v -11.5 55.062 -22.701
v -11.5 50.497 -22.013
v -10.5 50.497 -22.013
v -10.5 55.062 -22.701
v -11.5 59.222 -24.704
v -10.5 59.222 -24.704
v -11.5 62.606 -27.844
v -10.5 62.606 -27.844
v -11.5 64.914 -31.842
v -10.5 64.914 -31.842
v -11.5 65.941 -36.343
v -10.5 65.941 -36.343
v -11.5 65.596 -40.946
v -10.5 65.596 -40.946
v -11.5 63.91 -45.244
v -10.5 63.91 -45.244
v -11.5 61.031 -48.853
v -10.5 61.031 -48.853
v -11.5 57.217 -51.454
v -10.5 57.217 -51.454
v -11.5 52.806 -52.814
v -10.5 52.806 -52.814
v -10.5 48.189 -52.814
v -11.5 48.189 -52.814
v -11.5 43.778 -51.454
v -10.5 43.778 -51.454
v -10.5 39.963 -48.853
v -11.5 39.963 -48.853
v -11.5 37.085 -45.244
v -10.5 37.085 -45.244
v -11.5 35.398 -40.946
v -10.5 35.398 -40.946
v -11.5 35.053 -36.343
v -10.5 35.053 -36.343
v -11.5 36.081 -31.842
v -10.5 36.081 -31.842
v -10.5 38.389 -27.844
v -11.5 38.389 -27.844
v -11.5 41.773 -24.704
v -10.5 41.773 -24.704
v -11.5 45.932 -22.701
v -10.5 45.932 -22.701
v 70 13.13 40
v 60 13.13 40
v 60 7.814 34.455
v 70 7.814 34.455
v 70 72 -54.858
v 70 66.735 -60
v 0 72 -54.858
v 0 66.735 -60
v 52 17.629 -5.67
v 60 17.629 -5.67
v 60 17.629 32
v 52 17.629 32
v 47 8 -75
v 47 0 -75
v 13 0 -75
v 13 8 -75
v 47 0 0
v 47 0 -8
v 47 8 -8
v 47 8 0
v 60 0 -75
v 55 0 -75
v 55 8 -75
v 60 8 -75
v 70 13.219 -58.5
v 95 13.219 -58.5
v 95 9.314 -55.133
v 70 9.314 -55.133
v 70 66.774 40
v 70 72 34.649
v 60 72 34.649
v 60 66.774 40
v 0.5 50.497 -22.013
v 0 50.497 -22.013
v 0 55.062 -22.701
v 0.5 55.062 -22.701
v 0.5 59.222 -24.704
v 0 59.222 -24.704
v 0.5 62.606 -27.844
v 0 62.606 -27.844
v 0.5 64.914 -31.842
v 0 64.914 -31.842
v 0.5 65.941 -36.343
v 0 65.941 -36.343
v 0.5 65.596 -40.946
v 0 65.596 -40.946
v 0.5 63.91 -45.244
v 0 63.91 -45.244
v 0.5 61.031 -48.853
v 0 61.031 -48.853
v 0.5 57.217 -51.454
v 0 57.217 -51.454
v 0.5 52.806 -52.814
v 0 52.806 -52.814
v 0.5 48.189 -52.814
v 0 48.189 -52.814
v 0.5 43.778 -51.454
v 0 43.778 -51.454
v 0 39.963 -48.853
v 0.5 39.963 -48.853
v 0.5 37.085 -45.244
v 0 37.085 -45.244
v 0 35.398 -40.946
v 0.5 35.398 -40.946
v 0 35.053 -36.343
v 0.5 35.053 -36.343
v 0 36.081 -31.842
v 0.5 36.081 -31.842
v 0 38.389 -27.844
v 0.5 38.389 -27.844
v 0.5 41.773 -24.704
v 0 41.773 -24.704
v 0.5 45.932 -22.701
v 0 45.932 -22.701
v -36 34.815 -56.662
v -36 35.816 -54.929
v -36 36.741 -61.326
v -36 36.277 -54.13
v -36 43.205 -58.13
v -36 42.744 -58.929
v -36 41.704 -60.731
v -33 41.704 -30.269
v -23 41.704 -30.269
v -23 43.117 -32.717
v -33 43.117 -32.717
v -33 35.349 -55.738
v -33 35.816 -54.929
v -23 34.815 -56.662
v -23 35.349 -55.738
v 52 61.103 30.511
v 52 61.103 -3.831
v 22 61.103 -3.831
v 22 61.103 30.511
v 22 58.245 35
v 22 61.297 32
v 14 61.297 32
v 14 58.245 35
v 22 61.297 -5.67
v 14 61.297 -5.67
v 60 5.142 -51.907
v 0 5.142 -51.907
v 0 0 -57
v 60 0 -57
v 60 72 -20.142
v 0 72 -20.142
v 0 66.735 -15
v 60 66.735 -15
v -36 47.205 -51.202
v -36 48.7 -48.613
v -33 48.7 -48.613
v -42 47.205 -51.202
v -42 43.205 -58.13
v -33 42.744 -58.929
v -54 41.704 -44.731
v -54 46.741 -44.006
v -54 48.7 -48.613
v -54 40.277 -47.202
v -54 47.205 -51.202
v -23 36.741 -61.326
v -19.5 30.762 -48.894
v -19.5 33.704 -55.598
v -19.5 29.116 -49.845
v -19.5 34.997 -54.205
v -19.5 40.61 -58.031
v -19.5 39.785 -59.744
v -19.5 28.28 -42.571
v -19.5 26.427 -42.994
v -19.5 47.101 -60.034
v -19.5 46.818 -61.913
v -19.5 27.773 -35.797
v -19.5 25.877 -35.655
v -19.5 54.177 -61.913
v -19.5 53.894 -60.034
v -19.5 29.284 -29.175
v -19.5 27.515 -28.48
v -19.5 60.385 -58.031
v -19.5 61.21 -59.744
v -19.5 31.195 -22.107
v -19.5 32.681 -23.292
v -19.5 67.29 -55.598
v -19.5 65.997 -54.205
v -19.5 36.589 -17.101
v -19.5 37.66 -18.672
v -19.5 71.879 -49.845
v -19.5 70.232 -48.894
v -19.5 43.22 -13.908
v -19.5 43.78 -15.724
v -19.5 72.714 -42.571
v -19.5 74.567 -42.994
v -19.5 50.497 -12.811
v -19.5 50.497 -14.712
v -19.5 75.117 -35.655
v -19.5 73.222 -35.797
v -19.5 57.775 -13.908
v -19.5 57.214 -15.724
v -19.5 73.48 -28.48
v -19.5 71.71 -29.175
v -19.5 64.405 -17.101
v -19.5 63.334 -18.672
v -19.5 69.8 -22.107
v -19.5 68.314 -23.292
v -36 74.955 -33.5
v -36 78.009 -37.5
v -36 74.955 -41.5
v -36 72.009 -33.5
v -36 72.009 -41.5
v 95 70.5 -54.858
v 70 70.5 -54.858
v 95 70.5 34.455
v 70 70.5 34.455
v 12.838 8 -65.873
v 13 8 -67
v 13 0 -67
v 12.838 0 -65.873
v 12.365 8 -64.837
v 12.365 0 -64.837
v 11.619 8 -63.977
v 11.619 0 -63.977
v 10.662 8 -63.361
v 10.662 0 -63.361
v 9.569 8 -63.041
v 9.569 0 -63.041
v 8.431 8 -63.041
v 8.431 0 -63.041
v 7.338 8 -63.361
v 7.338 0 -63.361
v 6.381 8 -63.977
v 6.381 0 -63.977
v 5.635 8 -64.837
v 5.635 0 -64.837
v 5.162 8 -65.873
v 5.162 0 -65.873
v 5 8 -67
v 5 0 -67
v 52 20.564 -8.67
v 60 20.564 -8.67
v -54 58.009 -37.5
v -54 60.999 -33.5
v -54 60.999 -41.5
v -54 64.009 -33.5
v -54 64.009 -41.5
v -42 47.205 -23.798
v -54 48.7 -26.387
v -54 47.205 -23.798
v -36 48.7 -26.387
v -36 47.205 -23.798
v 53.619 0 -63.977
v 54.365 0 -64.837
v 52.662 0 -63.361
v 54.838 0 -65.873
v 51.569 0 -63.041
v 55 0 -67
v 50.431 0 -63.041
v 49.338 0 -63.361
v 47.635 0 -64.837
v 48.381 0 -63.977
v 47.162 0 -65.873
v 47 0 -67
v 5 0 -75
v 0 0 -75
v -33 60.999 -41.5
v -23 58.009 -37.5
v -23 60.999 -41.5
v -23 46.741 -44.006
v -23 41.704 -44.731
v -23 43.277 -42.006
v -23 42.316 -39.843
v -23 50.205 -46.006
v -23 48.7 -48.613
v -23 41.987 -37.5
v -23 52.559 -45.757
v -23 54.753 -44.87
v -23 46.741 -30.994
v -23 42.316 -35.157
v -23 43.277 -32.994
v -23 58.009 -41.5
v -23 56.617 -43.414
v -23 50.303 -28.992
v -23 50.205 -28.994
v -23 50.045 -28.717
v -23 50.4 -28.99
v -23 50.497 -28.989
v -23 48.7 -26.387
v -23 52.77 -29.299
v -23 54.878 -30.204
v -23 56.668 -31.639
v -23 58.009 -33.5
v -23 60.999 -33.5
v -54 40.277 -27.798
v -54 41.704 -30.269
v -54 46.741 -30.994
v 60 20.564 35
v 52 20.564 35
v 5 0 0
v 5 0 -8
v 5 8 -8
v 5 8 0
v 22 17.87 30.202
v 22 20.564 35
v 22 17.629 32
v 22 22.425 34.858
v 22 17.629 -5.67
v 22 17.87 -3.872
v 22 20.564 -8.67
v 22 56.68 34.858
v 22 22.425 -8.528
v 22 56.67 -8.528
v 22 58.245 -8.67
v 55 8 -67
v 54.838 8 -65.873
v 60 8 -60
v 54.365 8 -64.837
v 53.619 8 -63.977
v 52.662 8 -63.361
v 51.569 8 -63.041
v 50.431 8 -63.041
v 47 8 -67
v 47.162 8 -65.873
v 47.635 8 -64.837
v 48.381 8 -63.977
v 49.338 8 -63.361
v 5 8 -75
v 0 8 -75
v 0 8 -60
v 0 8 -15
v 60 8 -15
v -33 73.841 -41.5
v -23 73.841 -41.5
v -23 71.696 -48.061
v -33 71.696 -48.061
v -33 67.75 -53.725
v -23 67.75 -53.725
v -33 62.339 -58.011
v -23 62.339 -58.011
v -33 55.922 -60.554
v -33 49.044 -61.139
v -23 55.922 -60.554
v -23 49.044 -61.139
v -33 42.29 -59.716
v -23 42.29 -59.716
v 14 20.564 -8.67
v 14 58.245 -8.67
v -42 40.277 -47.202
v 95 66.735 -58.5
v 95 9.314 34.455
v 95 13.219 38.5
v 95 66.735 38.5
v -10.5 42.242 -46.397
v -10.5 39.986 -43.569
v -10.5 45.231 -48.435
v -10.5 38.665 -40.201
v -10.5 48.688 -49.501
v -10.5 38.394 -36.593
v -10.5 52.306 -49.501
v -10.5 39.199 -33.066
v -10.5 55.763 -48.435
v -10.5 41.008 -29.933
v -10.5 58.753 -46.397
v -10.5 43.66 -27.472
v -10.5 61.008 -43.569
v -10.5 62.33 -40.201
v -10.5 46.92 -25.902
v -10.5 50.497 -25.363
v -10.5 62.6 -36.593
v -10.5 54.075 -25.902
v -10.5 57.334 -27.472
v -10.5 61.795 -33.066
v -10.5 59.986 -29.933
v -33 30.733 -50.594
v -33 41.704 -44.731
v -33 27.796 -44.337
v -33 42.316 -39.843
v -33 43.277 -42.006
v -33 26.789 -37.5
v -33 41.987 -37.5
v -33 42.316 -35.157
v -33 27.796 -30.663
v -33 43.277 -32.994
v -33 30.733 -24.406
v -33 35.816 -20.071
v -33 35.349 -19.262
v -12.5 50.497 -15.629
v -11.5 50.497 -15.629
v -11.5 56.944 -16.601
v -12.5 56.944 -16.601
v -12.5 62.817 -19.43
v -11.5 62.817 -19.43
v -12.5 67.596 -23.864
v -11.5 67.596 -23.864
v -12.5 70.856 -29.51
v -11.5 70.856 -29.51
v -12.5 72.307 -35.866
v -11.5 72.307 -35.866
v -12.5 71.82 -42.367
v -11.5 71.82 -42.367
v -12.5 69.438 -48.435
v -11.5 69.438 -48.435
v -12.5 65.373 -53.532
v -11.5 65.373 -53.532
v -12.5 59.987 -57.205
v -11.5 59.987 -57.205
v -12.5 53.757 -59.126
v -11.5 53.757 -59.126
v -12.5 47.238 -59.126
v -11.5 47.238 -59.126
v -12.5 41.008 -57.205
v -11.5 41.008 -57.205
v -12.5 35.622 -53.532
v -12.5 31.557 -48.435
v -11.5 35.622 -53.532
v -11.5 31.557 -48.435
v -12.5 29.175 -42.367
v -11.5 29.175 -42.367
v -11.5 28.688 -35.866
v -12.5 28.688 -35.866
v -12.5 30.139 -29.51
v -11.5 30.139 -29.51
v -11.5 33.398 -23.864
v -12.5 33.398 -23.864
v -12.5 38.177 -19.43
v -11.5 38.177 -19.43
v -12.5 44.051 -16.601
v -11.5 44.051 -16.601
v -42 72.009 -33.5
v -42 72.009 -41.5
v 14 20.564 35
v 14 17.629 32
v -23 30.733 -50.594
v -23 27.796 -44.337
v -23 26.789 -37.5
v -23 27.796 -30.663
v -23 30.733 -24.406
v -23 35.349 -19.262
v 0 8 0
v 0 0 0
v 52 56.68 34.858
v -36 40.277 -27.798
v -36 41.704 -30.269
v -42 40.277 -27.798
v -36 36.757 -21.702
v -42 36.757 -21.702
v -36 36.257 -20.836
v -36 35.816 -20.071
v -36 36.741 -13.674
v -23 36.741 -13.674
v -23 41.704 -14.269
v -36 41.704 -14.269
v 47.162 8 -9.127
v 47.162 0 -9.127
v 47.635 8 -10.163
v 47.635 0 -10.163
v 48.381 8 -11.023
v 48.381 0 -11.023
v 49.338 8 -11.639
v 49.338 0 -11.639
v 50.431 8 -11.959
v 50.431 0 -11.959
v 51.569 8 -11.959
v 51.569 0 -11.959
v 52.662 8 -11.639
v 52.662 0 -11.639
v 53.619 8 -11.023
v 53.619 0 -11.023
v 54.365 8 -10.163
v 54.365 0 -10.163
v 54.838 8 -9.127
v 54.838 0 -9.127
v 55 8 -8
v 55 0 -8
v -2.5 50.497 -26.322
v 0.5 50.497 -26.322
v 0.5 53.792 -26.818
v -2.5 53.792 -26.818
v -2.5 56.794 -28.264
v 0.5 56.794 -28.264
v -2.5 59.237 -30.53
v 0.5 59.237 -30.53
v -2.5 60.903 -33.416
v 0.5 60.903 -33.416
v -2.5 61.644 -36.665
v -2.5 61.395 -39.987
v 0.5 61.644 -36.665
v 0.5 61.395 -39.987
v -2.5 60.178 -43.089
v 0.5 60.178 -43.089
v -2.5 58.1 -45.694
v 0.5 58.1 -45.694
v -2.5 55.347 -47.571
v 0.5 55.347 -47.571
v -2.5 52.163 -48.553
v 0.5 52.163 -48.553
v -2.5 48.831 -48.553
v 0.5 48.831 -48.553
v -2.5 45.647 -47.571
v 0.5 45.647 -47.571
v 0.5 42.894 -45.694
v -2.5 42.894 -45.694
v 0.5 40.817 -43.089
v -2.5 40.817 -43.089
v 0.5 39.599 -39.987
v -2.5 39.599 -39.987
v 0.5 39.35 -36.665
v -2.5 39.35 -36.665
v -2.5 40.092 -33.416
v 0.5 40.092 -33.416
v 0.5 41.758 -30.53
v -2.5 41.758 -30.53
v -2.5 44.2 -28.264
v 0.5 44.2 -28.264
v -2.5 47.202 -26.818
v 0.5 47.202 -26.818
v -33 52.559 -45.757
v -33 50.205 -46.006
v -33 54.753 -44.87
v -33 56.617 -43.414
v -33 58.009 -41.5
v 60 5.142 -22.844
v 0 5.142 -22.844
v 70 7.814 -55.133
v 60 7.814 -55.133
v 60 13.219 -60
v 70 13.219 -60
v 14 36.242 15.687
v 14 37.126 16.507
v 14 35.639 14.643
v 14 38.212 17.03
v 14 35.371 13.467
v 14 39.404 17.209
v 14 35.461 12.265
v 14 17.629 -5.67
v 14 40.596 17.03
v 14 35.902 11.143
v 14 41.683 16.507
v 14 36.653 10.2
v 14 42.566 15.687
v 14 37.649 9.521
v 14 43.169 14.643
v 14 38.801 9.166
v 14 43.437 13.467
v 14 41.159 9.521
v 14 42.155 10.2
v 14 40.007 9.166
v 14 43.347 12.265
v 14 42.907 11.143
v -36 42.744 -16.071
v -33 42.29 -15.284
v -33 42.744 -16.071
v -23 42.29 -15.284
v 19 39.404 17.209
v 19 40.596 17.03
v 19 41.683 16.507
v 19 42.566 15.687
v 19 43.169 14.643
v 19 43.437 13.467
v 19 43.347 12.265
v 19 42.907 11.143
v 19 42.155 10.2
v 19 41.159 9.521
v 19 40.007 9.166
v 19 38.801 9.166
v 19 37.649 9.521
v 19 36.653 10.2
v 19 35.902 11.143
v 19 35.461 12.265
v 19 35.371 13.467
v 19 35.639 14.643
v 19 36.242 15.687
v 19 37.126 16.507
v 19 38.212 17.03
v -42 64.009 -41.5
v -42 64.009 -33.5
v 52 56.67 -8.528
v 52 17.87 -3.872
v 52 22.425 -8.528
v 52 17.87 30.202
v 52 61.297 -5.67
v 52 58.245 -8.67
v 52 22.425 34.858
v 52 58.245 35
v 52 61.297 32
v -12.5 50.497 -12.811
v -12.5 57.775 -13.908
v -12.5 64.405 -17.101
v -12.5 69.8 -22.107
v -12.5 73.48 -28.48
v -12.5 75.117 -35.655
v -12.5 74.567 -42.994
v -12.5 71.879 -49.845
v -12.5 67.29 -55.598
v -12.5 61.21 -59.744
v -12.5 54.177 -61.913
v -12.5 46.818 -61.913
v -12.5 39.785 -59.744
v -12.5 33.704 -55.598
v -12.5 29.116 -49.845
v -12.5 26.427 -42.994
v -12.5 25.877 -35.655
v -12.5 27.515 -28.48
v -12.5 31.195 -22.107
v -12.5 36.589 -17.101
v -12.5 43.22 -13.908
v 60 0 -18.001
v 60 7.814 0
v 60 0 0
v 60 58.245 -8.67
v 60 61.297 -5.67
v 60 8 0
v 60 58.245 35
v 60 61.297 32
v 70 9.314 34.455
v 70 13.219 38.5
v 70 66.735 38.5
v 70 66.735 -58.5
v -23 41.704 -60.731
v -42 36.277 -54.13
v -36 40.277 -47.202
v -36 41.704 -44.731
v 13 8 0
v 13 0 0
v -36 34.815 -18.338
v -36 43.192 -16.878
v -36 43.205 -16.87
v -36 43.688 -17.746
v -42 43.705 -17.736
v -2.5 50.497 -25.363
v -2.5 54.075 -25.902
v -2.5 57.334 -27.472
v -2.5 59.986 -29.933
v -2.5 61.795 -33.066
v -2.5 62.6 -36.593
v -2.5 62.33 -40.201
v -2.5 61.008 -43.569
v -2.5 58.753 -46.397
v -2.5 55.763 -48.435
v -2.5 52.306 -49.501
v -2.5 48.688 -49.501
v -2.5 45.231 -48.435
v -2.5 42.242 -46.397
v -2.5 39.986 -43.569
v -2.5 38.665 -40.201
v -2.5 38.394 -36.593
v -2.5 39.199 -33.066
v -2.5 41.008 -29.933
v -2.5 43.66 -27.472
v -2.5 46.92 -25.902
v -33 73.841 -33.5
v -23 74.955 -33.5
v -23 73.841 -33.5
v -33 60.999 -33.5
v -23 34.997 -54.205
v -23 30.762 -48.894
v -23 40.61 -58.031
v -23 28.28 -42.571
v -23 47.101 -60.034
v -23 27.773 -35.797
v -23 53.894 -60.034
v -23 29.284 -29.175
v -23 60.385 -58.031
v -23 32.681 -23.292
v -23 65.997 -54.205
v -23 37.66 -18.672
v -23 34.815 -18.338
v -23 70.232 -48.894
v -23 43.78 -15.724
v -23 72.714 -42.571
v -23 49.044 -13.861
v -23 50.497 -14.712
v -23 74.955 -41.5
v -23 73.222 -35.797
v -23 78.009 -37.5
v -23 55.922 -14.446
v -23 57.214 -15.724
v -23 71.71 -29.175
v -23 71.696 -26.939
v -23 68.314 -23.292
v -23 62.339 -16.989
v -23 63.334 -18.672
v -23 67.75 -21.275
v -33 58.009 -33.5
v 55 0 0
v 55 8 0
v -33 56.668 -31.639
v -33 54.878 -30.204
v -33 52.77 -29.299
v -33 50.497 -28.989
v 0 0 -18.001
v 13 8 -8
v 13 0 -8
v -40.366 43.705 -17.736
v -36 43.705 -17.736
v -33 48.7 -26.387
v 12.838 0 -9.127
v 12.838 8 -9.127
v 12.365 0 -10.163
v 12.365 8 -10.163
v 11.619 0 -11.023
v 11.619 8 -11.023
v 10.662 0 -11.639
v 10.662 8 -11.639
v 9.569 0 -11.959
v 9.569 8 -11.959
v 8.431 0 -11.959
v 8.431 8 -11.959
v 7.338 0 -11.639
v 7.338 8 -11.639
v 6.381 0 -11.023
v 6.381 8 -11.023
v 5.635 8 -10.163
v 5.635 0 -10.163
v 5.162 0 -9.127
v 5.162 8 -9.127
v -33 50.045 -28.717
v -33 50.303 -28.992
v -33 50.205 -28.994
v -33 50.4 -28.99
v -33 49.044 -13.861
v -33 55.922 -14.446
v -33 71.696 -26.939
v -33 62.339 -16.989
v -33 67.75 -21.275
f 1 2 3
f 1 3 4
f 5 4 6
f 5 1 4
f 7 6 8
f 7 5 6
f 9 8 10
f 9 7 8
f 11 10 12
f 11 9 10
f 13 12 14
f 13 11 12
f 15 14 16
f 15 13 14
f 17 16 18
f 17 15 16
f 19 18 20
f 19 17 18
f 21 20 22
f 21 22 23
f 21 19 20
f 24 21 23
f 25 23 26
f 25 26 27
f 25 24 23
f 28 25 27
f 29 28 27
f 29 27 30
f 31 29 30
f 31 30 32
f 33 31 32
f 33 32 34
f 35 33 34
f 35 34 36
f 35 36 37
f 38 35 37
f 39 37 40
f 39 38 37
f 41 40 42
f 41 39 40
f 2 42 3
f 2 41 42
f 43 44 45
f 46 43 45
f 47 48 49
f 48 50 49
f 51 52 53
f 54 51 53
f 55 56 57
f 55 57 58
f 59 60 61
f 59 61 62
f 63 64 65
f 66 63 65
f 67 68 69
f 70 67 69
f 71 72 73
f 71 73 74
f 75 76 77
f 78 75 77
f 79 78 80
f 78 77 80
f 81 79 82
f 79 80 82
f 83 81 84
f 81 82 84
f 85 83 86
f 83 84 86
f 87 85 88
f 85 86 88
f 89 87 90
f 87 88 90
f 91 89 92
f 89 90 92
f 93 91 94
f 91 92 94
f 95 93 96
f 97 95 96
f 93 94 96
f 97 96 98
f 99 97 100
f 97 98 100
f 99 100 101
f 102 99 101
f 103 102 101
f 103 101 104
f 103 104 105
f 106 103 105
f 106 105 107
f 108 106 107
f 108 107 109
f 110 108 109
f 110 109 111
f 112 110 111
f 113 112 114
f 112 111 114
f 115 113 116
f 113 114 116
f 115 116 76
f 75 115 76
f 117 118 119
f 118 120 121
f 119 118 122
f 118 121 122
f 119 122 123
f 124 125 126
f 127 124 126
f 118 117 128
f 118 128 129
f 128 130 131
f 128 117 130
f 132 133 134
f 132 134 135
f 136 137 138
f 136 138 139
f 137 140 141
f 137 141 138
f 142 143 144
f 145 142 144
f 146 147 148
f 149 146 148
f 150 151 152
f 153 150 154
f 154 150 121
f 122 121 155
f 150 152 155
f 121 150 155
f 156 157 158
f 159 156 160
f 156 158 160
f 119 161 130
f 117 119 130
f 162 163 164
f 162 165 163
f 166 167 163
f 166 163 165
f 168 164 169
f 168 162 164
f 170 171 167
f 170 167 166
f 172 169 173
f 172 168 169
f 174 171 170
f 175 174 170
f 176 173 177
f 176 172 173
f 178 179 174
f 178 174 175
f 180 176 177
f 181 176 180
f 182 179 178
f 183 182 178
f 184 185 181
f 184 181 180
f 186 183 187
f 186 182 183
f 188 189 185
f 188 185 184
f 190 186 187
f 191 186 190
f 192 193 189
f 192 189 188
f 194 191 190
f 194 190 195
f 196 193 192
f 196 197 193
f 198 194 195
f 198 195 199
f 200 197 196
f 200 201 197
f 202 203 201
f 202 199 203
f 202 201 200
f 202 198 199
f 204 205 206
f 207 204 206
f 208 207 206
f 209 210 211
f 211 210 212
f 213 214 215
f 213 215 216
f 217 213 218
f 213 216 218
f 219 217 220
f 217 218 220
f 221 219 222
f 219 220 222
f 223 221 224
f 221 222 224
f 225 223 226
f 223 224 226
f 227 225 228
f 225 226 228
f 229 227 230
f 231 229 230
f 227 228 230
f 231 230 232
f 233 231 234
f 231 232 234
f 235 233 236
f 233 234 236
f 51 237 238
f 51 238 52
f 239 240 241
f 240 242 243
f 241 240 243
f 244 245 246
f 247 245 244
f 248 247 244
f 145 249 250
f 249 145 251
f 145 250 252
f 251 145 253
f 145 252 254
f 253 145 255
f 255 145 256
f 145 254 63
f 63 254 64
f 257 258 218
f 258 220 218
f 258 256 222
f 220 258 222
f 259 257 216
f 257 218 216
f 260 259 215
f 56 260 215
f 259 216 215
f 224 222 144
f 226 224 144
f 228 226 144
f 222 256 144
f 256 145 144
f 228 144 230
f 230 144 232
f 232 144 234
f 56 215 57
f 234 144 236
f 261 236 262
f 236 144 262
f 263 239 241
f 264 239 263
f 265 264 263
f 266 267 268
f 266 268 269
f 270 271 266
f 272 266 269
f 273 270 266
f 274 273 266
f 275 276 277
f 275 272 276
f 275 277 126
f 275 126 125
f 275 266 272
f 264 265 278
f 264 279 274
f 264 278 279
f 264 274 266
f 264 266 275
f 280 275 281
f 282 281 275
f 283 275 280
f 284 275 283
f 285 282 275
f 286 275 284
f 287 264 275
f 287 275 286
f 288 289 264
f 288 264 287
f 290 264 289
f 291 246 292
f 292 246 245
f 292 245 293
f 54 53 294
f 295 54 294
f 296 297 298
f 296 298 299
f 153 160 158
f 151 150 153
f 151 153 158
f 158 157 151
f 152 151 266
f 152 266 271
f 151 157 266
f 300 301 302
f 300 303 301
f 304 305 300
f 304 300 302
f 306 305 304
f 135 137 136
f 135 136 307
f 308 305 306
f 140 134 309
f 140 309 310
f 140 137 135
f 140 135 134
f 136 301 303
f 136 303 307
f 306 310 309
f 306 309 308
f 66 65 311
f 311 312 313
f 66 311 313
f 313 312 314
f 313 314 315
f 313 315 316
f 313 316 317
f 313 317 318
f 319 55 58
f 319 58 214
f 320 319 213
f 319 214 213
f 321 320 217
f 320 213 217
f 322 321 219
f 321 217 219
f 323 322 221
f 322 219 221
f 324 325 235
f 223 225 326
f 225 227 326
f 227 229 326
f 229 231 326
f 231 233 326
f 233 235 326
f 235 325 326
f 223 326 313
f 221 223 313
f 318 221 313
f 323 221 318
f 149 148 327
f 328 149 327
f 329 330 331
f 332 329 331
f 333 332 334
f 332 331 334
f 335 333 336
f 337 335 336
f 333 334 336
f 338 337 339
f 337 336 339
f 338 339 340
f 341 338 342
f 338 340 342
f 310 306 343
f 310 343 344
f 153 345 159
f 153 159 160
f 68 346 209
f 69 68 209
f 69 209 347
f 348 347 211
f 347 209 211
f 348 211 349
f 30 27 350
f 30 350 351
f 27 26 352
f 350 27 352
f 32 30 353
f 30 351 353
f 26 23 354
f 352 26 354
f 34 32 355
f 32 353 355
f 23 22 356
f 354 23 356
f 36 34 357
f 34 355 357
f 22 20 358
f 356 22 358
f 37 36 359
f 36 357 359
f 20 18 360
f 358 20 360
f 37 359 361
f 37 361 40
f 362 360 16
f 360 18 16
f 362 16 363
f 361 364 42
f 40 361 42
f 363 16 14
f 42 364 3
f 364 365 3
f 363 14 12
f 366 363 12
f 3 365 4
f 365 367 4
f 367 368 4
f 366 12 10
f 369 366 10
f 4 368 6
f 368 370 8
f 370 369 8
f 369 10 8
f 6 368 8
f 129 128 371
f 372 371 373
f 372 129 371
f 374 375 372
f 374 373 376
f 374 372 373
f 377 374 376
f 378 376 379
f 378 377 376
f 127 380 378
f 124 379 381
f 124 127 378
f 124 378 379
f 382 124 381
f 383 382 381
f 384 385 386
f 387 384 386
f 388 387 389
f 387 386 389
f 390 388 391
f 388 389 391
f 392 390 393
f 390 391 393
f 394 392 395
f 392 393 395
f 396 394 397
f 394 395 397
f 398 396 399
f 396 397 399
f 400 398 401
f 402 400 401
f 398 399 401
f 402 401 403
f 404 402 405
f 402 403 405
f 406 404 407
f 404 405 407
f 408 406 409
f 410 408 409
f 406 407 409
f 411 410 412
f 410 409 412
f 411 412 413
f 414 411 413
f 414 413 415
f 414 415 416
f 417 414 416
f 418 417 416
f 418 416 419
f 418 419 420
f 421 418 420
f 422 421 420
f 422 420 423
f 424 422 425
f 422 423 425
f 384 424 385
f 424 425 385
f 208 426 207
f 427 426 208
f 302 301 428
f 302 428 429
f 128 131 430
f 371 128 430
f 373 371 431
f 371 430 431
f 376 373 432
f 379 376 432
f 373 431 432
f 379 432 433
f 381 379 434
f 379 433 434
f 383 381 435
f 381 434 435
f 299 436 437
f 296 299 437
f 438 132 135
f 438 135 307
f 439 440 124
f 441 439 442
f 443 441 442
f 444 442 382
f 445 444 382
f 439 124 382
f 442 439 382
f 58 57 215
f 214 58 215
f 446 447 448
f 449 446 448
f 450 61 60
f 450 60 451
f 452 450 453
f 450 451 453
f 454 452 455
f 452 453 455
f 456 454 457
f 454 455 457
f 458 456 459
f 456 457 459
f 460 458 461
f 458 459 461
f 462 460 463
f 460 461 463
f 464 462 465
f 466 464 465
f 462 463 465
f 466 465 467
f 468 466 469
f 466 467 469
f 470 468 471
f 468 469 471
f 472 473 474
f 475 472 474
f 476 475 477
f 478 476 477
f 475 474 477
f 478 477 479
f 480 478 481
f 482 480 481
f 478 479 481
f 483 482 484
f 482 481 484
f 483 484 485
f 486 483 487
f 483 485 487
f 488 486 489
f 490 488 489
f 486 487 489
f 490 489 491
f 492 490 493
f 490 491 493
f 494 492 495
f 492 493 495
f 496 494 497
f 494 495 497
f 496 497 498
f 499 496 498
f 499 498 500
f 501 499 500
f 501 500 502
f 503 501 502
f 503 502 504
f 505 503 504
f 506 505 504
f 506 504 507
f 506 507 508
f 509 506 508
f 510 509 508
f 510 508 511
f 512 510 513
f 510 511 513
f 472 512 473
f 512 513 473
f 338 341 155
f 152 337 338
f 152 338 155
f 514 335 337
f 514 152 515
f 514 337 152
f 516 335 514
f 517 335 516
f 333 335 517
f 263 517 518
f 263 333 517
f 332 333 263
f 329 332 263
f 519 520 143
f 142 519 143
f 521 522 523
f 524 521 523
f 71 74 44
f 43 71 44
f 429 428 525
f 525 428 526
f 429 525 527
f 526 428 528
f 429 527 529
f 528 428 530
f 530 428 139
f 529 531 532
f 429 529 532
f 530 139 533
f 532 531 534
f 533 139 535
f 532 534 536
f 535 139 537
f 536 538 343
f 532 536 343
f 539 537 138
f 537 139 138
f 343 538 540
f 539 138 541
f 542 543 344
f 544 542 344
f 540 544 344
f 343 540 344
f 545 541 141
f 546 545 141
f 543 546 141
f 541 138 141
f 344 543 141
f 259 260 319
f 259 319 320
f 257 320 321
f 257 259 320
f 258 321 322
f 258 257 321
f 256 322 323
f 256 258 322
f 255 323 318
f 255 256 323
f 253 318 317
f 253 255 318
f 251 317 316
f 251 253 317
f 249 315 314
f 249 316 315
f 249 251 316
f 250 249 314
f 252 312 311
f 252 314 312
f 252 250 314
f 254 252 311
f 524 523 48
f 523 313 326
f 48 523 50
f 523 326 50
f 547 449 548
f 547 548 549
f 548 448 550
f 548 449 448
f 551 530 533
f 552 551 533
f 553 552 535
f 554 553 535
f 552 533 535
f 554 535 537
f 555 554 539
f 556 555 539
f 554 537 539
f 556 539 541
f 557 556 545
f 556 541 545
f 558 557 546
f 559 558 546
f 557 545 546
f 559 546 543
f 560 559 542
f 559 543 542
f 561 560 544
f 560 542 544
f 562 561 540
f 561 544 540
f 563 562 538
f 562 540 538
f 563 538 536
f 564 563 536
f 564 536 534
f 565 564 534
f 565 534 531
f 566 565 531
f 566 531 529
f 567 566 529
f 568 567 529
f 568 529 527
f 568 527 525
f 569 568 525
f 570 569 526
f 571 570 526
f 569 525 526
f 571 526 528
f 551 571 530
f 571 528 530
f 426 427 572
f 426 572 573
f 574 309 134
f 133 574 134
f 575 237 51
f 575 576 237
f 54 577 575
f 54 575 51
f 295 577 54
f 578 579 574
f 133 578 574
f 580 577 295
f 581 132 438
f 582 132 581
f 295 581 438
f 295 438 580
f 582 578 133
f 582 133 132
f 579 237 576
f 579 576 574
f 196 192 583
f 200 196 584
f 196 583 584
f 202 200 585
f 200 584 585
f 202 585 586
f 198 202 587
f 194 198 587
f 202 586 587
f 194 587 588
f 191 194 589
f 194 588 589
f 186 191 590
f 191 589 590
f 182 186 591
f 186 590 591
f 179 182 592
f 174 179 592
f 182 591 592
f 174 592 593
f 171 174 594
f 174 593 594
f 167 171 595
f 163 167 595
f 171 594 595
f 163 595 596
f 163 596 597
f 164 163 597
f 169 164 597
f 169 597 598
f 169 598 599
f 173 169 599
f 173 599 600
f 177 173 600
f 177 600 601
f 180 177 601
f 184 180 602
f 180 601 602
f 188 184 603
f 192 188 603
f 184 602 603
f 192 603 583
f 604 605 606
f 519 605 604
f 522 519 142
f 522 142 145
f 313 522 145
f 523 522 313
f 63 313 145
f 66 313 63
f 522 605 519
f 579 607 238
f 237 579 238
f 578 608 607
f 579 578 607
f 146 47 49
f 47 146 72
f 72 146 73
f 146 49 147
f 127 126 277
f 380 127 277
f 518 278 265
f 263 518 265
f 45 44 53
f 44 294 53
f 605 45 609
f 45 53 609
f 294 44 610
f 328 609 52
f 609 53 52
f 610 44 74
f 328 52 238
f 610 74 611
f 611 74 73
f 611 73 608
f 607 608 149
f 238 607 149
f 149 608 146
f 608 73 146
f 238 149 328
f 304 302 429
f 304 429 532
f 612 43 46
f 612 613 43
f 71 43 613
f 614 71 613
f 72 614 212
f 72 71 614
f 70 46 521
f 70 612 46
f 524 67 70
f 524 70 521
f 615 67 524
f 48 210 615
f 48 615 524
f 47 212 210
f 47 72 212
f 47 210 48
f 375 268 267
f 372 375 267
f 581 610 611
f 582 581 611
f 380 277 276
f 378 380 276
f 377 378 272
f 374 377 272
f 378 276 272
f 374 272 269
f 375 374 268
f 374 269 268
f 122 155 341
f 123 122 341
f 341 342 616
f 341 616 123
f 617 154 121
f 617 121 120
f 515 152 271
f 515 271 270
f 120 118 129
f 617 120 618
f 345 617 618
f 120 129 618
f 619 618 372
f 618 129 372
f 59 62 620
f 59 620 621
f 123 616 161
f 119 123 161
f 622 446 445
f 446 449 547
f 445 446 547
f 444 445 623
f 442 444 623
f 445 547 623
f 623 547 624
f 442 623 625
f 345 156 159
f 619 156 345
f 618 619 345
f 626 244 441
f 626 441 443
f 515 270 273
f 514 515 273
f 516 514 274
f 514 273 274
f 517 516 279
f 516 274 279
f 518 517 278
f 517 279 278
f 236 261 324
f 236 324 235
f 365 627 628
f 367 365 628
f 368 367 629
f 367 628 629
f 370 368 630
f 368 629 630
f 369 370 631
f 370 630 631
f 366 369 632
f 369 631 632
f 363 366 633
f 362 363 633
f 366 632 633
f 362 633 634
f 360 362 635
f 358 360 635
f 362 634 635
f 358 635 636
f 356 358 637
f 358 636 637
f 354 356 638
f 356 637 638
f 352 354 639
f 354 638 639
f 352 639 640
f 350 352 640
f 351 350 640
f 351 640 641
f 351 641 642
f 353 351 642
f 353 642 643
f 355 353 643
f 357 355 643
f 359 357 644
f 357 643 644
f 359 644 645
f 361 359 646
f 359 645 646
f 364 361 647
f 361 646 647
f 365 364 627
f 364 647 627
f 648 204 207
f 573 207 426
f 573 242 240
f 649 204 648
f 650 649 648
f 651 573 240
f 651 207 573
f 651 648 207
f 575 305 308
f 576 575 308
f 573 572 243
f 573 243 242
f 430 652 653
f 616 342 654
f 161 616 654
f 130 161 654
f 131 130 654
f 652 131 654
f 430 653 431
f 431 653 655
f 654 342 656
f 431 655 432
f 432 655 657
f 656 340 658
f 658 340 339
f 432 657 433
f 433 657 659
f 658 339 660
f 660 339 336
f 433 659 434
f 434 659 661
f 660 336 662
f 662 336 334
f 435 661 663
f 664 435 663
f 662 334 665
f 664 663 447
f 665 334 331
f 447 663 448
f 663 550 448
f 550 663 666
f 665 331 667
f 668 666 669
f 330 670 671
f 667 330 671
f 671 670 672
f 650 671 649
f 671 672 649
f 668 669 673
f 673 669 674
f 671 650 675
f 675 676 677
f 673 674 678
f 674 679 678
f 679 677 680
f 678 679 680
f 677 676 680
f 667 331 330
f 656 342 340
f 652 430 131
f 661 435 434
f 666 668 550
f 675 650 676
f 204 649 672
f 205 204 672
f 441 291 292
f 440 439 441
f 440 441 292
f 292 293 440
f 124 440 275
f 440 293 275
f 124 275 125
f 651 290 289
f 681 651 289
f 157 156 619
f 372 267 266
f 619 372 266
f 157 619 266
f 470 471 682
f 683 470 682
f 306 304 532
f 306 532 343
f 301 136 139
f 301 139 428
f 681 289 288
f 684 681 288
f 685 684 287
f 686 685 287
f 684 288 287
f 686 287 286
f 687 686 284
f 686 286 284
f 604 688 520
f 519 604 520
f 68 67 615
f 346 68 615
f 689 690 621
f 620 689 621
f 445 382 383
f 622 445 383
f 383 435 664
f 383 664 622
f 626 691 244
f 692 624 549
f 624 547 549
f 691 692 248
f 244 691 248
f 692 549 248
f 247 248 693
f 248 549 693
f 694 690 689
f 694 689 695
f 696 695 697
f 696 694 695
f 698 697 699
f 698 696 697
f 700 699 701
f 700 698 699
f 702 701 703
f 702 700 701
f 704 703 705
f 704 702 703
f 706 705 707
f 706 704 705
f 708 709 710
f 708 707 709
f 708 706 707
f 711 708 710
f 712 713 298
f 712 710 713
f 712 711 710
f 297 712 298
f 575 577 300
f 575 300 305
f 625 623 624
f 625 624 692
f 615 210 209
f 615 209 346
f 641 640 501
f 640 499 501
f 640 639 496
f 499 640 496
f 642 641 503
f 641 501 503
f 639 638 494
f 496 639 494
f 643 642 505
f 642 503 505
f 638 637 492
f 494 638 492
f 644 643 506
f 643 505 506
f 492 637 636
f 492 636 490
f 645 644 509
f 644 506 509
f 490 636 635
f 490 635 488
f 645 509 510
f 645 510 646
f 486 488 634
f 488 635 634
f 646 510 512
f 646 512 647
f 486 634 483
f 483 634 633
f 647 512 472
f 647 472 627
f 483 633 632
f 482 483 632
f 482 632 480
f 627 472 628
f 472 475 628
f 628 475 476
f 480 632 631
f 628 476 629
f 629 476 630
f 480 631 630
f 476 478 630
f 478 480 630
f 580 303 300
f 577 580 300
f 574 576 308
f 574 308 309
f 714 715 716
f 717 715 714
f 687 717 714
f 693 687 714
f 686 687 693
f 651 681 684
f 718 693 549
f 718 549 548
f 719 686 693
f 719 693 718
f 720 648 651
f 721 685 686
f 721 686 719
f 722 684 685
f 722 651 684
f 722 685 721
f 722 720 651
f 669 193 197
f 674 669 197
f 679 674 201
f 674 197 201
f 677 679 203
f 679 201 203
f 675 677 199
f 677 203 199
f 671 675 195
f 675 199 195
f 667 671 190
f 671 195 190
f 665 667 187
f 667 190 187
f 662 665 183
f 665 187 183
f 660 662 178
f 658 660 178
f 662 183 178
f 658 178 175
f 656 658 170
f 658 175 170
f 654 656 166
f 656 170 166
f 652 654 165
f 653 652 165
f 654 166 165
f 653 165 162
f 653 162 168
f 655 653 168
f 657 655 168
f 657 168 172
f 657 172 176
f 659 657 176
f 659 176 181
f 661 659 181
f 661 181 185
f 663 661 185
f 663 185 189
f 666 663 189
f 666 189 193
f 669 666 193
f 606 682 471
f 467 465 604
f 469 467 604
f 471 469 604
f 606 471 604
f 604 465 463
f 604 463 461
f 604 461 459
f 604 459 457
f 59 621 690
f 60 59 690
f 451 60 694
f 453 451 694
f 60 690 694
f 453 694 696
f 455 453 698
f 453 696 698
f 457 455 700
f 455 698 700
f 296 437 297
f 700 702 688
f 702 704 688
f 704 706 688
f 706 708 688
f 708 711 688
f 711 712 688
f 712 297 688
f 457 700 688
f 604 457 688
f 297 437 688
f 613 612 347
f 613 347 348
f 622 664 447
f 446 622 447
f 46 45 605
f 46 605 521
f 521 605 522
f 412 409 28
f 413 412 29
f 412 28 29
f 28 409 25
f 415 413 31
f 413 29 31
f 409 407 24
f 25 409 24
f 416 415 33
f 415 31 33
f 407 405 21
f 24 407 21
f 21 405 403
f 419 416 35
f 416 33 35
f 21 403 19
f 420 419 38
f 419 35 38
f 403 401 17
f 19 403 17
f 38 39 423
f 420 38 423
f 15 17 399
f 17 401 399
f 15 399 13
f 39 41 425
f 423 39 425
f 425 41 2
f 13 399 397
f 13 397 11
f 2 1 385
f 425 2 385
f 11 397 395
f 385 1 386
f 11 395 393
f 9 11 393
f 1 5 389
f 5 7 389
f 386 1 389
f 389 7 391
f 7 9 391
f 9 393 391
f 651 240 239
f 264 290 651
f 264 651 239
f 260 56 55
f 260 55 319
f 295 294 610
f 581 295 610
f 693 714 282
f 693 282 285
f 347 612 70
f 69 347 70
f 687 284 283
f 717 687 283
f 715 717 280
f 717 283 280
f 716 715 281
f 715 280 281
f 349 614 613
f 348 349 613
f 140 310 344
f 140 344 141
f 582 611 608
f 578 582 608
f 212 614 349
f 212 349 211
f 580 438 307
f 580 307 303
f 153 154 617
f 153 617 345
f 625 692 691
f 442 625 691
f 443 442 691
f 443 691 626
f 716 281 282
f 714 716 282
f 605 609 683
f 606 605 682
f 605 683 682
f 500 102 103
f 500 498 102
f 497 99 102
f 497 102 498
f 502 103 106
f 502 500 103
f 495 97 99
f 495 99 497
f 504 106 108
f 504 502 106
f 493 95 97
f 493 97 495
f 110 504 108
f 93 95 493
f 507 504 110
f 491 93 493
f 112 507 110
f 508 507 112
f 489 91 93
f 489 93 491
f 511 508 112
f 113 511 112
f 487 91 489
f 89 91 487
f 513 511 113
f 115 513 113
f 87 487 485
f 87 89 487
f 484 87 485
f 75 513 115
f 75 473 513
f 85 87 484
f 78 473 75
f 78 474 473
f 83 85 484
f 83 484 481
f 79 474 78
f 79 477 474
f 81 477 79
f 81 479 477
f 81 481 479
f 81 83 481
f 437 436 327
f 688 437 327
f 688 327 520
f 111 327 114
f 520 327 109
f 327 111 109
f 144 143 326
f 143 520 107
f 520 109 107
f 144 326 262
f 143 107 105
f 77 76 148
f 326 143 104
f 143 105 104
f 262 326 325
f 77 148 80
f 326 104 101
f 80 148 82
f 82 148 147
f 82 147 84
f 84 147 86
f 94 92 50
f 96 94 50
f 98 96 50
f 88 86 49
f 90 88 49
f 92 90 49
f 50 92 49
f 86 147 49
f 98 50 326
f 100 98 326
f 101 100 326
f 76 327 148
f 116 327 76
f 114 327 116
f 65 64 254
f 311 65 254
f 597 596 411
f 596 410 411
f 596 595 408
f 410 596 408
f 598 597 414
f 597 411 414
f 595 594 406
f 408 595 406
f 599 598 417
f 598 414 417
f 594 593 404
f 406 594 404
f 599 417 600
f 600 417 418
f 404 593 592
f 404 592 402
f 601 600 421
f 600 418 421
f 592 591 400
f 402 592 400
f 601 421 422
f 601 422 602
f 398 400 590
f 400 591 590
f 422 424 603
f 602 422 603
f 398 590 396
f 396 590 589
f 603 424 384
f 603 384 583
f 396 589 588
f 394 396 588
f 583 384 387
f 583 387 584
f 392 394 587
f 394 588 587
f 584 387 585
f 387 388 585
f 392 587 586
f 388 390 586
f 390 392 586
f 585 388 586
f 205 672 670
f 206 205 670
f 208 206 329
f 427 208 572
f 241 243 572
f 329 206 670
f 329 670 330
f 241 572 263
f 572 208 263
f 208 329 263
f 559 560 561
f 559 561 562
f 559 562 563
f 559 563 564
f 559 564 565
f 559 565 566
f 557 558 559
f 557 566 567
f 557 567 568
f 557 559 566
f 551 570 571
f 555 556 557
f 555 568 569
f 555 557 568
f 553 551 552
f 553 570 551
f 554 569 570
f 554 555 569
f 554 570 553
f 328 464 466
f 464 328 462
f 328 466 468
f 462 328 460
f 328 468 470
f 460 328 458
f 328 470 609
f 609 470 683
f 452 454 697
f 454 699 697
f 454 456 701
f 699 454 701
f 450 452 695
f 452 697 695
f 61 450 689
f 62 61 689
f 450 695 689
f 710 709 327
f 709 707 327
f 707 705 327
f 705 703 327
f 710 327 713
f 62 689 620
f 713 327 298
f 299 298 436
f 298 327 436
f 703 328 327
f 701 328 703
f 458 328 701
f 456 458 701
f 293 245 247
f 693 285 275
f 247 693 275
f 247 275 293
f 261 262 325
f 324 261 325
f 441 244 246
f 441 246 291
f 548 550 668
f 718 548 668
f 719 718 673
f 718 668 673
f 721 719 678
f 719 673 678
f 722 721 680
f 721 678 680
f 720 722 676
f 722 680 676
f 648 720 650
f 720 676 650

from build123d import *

# Parameters (mm, degrees)
BOSS_EXTRUDE1_DEPTH    = 60
CUT_EXTRUDE1_DEPTH     = 121.037494142
BOSS_EXTRUDE5_DEPTH    = 10
BOSS_EXTRUDE6_DEPTH    = 25
BOSS_EXTRUDE7_DEPTH    = 8
BOSS_EXTRUDE8_DEPTH    = 30
BOSS_EXTRUDE9_DEPTH    = 8
SKETCH8_R              = 4.044381725
CUT_EXTRUDE2_DEPTH     = 5
SKETCH9_R              = 15.487315424
CUT_EXTRUDE3_DEPTH     = 0.5
SKETCH10_R             = 11.178262473
BOSS_EXTRUDE10_DEPTH   = 3
SKETCH11_R             = 12.137000118
BOSS_EXTRUDE11_DEPTH   = 8
BOSS_EXTRUDE12_START   = 1
SKETCH12_R             = 15.487315424
BOSS_EXTRUDE12_DEPTH   = 1
SKETCH13_R             = 21.870620662
BOSS_EXTRUDE13_DEPTH   = 1
SKETCH14_R             = 24.68912304
BOSS_EXTRUDE14_DEPTH   = 7
SKETCH15_R             = 22.788184892
BOSS_EXTRUDE15_DEPTH   = 3.5
BOSS_EXTRUDE17_DEPTH   = 10
BOSS_EXTRUDE18_DEPTH   = 25
CUT_EXTRUDE4_DEPTH     = 12
CUT_EXTRUDE5_DEPTH     = 12
SKETCH20_W             = 8
SKETCH20_H             = 8
CUT_EXTRUDE6_DEPTH     = 6
BOSS_EXTRUDE19_DEPTH   = 12
BOSS_EXTRUDE19_2_DEPTH = 12
BOSS_EXTRUDE19_3_DEPTH = 12
CUT_EXTRUDE7_DEPTH     = 12
CUT_EXTRUDE8_DEPTH     = 1
CUT_EXTRUDE9_DEPTH     = 1
BOSS_EXTRUDE20_DEPTH   = 6


with BuildPart() as part:
    # Sketch1 → Boss-Extrude1 (new body)
    with BuildSketch(Plane(origin=(0, 0, 0), x_dir=(0, 0, -1), z_dir=(1, 0, 0))):
        Polygon((0, 8), (0, 0), (18.000733745, 0), (22.844437025, 5.141795141), (51.906656706, 5.141795141), (57, 0), (75, 0), (75, 8), (60, 8), (60, 66.734849184), (54.858204859, 72), (20.141795141, 72), (15, 66.734849184), (15, 8), align=None)
    extrude(amount=BOSS_EXTRUDE1_DEPTH)

    # Sketch2 → Cut-Extrude1 (cut, through all)
    with BuildSketch(Plane.XZ):
        with BuildLine():
            Line((55, -8), (55, 0))
            Line((55, 0), (47, 0))
            Line((47, 0), (47, -8))
            ThreePointArc((47, -8), (51, -12), (55, -8))
        make_face()
        with BuildLine():
            Line((13, 0), (5, 0))
            Line((5, 0), (5, -8))
            ThreePointArc((5, -8), (9, -12), (13, -8))
            Line((13, -8), (13, 0))
        make_face()
        with BuildLine():
            Line((47, -75), (55, -75))
            Line((55, -75), (55, -67))
            ThreePointArc((55, -67), (51, -63), (47, -67))
            Line((47, -67), (47, -75))
        make_face()
        with BuildLine():
            Line((5, -75), (13, -75))
            Line((13, -75), (13, -67))
            ThreePointArc((13, -67), (9, -63), (5, -67))
            Line((5, -67), (5, -75))
        make_face()
    extrude(amount=-CUT_EXTRUDE1_DEPTH, mode=Mode.SUBTRACT)

    # Sketch3 → Boss-Extrude5 (add)
    with BuildSketch(Plane(origin=(60, 0, 0), x_dir=(0, 0, -1), z_dir=(1, 0, 0))):
        Polygon((-40, 13.130427758), (-34.454678746, 7.813729324), (55.132936848, 7.813729324), (60, 13.21926496), (60, 66.734849184), (54.858204859, 72), (-34.64895923, 72), (-40, 66.774327195), align=None)
    extrude(amount=BOSS_EXTRUDE5_DEPTH)

    # Sketch4 → Boss-Extrude6 (add)
    with BuildSketch(Plane(origin=(70, 0, 0), x_dir=(0, 0, -1), z_dir=(1, 0, 0))):
        Polygon((-25.698394905, 70.5), (54.858204859, 70.5), (58.5, 66.734849184), (58.5, 39.977057072), (58.5, 13.21926496), (55.132936848, 9.313729324), (22.74008343, 9.313729324), (-34.454678746, 9.313729324), (-38.5, 13.21926496), (-38.5, 39.952377476), (-38.5, 66.734849184), (-34.454678746, 70.5), align=None)
    extrude(amount=BOSS_EXTRUDE6_DEPTH)

    # Sketch5 → Boss-Extrude7 (add)
    with BuildSketch(Plane.ZY.offset(-60)):
        Polygon((35, 20.563642038), (35, 58.244850637), (32, 61.296911147), (27.576585988, 61.296911147), (-5.67, 61.296911147), (-8.67, 58.244850637), (-8.67, 20.563642038), (-5.67, 17.628968471), (23.350656051, 17.628968471), (32, 17.628968471), align=None)
    extrude(amount=BOSS_EXTRUDE7_DEPTH)

    # Sketch6 → Boss-Extrude8 (add)
    with BuildSketch(Plane.ZY.offset(-52)):
        Polygon((34.858186176, 22.424916278), (34.858186176, 56.68012364), (30.510716808, 61.103036832), (-3.83089655, 61.103036832), (-8.528186176, 56.669693972), (-8.528186176, 22.424916278), (-3.871605337, 17.869734711), (30.201605337, 17.869734711), align=None)
    extrude(amount=BOSS_EXTRUDE8_DEPTH)

    # Sketch7 → Boss-Extrude9 (add)
    with BuildSketch(Plane.ZY.offset(-22)):
        Polygon((-8.67, 58.244850637), (-5.67, 61.296911147), (32, 61.296911147), (35, 58.244850637), (35, 20.563642038), (32, 17.628968471), (-5.67, 17.628968471), (-8.67, 20.563642038), align=None)
    extrude(amount=BOSS_EXTRUDE9_DEPTH)

    # Sketch8 → Cut-Extrude2 (cut)
    with BuildSketch(Plane.ZY.offset(-14)):
        with Locations((13.165, 39.404246338)):
            Circle(SKETCH8_R)
    extrude(amount=-CUT_EXTRUDE2_DEPTH, mode=Mode.SUBTRACT)

    # Sketch9 → Cut-Extrude3 (cut)
    with BuildSketch(Plane.ZY):
        with Locations((-37.5, 50.497312421)):
            Circle(SKETCH9_R)
    extrude(amount=-CUT_EXTRUDE3_DEPTH, mode=Mode.SUBTRACT)

    # Sketch10 → Boss-Extrude10 (add)
    with BuildSketch(Plane.ZY.offset(-0.5)):
        with Locations((-37.5, 50.497312421)):
            Circle(SKETCH10_R)
    extrude(amount=BOSS_EXTRUDE10_DEPTH)

    # Sketch11 → Boss-Extrude11 (add)
    with BuildSketch(Plane.ZY.offset(2.5)):
        with Locations((-37.5, 50.497312421)):
            Circle(SKETCH11_R)
    extrude(amount=BOSS_EXTRUDE11_DEPTH)

    # Sketch12 → Boss-Extrude12 (add)
    with BuildSketch(Plane.ZY.offset(10.5).offset(BOSS_EXTRUDE12_START)):
        with Locations((-37.5, 50.497312421)):
            Circle(SKETCH12_R)
    extrude(amount=-BOSS_EXTRUDE12_DEPTH)

    # Sketch13 → Boss-Extrude13 (add)
    with BuildSketch(Plane.ZY.offset(11.5)):
        with Locations((-37.5, 50.497312421)):
            Circle(SKETCH13_R)
    extrude(amount=BOSS_EXTRUDE13_DEPTH)

    # Sketch14 → Boss-Extrude14 (add)
    with BuildSketch(Plane.ZY.offset(12.5)):
        with Locations((-37.5, 50.497312421)):
            Circle(SKETCH14_R)
    extrude(amount=BOSS_EXTRUDE14_DEPTH)

    # Sketch15 → Boss-Extrude15 (add)
    with BuildSketch(Plane.ZY.offset(19.5)):
        with Locations((-37.5, 50.497312421)):
            Circle(SKETCH15_R)
    extrude(amount=BOSS_EXTRUDE15_DEPTH)

    # Sketch16 → Boss-Extrude17 (add)
    with BuildSketch(Plane.ZY.offset(23)):
        with BuildLine():
            ThreePointArc((-33.5, 58.009256763), (-30.12965531, 54.752582912), (-28.994465367, 50.205441864))
            Line((-28.994465367, 50.205441864), (-15.28400459, 42.289703644))
            ThreePointArc((-15.28400459, 42.289703644), (-16.989357143, 62.339137595), (-33.5, 73.840733204))
            Line((-33.5, 73.840733204), (-33.5, 58.009256763))
        make_face()
        with BuildLine():
            ThreePointArc((-46.005534633, 50.205441864), (-44.87034469, 54.752582912), (-41.5, 58.009256763))
            Line((-41.5, 58.009256763), (-41.5, 73.840733204))
            ThreePointArc((-41.5, 73.840733204), (-58.010642857, 62.339137595), (-59.71599541, 42.289703644))
            Line((-59.71599541, 42.289703644), (-46.005534633, 50.205441864))
        make_face()
        with BuildLine():
            ThreePointArc((-32.994465367, 43.277238634), (-37.5, 41.986771438), (-42.005534633, 43.277238634))
            Line((-42.005534633, 43.277238634), (-55.737647351, 35.34899966))
            ThreePointArc((-55.737647351, 35.34899966), (-37.5, 26.789019348), (-19.262352649, 35.34899966))
            Line((-19.262352649, 35.34899966), (-32.994465367, 43.277238634))
        make_face()
    extrude(amount=BOSS_EXTRUDE17_DEPTH)

    # Sketch17 → Boss-Extrude18 (add)
    with BuildSketch(Plane.ZY.offset(23)):
        Polygon((-41.5, 60.998662041), (-37.5, 58.009256763), (-33.5, 60.998662041), (-33.5, 74.954597667), (-37.5, 78.009256763), (-41.5, 74.954597667), align=None)
        Polygon((-26.387162336, 48.700114757), (-30.994465367, 46.741340249), (-30.269261267, 41.703841313), (-18.337601836, 34.815094529), (-13.673957292, 36.741340249), (-14.269261267, 41.703841313), align=None)
        Polygon((-44.730738733, 41.703841313), (-44.005534633, 46.741340249), (-48.612837664, 48.700114757), (-60.730738733, 41.703841313), (-61.326042708, 36.741340249), (-56.662398164, 34.815094529), align=None)
    extrude(amount=BOSS_EXTRUDE18_DEPTH)

    # Sketch18 → Cut-Extrude4 (cut)
    with BuildSketch(Plane.ZY.offset(48)):
        Polygon((-44.730738733, 41.703841313), (-44.005534633, 46.741340249), (-48.612837664, 48.700114757), (-51.201687055, 47.205441864), (-47.201687055, 40.277238634), align=None)
    extrude(amount=-CUT_EXTRUDE4_DEPTH, mode=Mode.SUBTRACT)

    # Sketch19 → Cut-Extrude5 (cut)
    with BuildSketch(Plane.ZY.offset(48)):
        Polygon((-26.387162336, 48.700114757), (-30.994465367, 46.741340249), (-30.269261267, 41.703841313), (-27.798312945, 40.277238634), (-23.798312945, 47.205441864), align=None)
        Polygon((-41.5, 60.998662041), (-37.5, 58.009256763), (-33.5, 60.998662041), (-33.5, 64.009256763), (-41.5, 64.009256763), align=None)
    extrude(amount=-CUT_EXTRUDE5_DEPTH, mode=Mode.SUBTRACT)

    # Sketch20 → Cut-Extrude6 (cut)
    with BuildSketch(Plane.ZY.offset(48)):
        with Locations((-37.5, 68.009256763)):
            Rectangle(SKETCH20_W, SKETCH20_H)
        Polygon((-20.835583463, 36.257304894), (-18.870109714, 39.741340249), (-16.870109714, 43.205441864), (-23.798312945, 47.205441864), (-27.798312945, 40.277238634), align=None)
        Polygon((-58.129890286, 43.205441864), (-54.129890286, 36.277238634), (-47.201687055, 40.277238634), (-51.201687055, 47.205441864), align=None)
    extrude(amount=-CUT_EXTRUDE6_DEPTH, mode=Mode.SUBTRACT)

    # Sketch22 → Cut-Extrude7 (cut)
    with BuildSketch(Plane.ZY.offset(48)):
        Polygon((-58.129890286, 43.205441864), (-54.129890286, 36.277238634), (-56.662398164, 34.815094529), (-61.326042708, 36.741340249), (-60.730738733, 41.703841313), align=None)
        Polygon((-20.835583463, 36.257304894), (-16.870109714, 43.205441864), (-14.269261267, 41.703841313), (-13.673957292, 36.741340249), (-18.337601836, 34.815094529), align=None)
        Polygon((-41.5, 74.954597667), (-37.5, 78.009256763), (-33.5, 74.954597667), (-33.5, 72.009256763), (-41.5, 72.009256763), align=None)
    extrude(amount=-CUT_EXTRUDE7_DEPTH, mode=Mode.SUBTRACT)

    # Sketch23 → Cut-Extrude8 (cut)
    with BuildSketch(Plane(origin=(0, 17.878010797, -31.325101527), x_dir=(1, 0, 0), z_dir=(0, -0.49567806364879385, 0.8685063368895948))):
        Polygon((-48, 29.201923716), (-36, 29.147090659), (-36, 21.147583248), (-48, 21.161957393), align=None)
    extrude(amount=-CUT_EXTRUDE8_DEPTH, mode=Mode.SUBTRACT)

    # Sketch24 → Cut-Extrude9 (cut)
    with BuildSketch(Plane(origin=(0.132430911, 25.171038803, 14.365734876), x_dir=(0.9999895603571438, -0.003968530082114351, -0.0022649383465402294), z_dir=(-0.00456937377835026, -0.8684972699936193, -0.4956728889468378))):
        Polygon((-40.498725216, -37.067786953), (-39.408108569, -36.067786953), (-36.132808125, -36.067786953), (-36.132808125, -37.067786953), align=None)
    extrude(amount=-CUT_EXTRUDE9_DEPTH, mode=Mode.SUBTRACT)



with BuildPart() as body_2:
    # Sketch21 → Boss-Extrude19 (new body)
    with BuildSketch(Plane.ZY.offset(42)):
        Polygon((-41.5, 64.009256763), (-33.5, 64.009256763), (-33.5, 60.998662041), (-37.5, 58.009256763), (-41.5, 60.998662041), align=None)
    extrude(amount=BOSS_EXTRUDE19_DEPTH)


with BuildPart() as body_3:
    # Sketch21 → Boss-Extrude19 2 (new body)
    with BuildSketch(Plane.ZY.offset(42)):
        Polygon((-26.387162336, 48.700114757), (-23.798312945, 47.205441864), (-27.798312945, 40.277238634), (-30.269261267, 41.703841313), (-30.994465367, 46.741340249), align=None)
    extrude(amount=BOSS_EXTRUDE19_2_DEPTH)


with BuildPart() as body_4:
    # Sketch21 → Boss-Extrude19 3 (new body)
    with BuildSketch(Plane.ZY.offset(42)):
        Polygon((-51.201687055, 47.205441864), (-48.612837664, 48.700114757), (-44.005534633, 46.741340249), (-44.730738733, 41.703841313), (-47.201687055, 40.277238634), align=None)
    extrude(amount=BOSS_EXTRUDE19_3_DEPTH)


with BuildPart() as part_1:
    add(part.part)

    add(body_2.part)  # Boss-Extrude20 merges body 2

    add(body_3.part)  # Boss-Extrude20 merges body 3

    add(body_4.part)  # Boss-Extrude20 merges body 4
    # Sketch26 → Boss-Extrude20 (add)
    with BuildSketch(Plane.ZY.offset(36)):
        Polygon((-41.5, 64.009256763), (-33.5, 64.009256763), (-33.5, 60.998662041), (-37.5, 58.009256763), (-41.5, 60.998662041), align=None)
        Polygon((-26.387162336, 48.700114757), (-23.798312945, 47.205441864), (-27.798312945, 40.277238634), (-30.269261267, 41.703841313), (-30.994465367, 46.741340249), align=None)
        Polygon((-51.201687055, 47.205441864), (-48.612837664, 48.700114757), (-44.005534633, 46.741340249), (-44.730738733, 41.703841313), (-47.201687055, 40.277238634), align=None)
    extrude(amount=BOSS_EXTRUDE20_DEPTH)


solid = part_1.part
